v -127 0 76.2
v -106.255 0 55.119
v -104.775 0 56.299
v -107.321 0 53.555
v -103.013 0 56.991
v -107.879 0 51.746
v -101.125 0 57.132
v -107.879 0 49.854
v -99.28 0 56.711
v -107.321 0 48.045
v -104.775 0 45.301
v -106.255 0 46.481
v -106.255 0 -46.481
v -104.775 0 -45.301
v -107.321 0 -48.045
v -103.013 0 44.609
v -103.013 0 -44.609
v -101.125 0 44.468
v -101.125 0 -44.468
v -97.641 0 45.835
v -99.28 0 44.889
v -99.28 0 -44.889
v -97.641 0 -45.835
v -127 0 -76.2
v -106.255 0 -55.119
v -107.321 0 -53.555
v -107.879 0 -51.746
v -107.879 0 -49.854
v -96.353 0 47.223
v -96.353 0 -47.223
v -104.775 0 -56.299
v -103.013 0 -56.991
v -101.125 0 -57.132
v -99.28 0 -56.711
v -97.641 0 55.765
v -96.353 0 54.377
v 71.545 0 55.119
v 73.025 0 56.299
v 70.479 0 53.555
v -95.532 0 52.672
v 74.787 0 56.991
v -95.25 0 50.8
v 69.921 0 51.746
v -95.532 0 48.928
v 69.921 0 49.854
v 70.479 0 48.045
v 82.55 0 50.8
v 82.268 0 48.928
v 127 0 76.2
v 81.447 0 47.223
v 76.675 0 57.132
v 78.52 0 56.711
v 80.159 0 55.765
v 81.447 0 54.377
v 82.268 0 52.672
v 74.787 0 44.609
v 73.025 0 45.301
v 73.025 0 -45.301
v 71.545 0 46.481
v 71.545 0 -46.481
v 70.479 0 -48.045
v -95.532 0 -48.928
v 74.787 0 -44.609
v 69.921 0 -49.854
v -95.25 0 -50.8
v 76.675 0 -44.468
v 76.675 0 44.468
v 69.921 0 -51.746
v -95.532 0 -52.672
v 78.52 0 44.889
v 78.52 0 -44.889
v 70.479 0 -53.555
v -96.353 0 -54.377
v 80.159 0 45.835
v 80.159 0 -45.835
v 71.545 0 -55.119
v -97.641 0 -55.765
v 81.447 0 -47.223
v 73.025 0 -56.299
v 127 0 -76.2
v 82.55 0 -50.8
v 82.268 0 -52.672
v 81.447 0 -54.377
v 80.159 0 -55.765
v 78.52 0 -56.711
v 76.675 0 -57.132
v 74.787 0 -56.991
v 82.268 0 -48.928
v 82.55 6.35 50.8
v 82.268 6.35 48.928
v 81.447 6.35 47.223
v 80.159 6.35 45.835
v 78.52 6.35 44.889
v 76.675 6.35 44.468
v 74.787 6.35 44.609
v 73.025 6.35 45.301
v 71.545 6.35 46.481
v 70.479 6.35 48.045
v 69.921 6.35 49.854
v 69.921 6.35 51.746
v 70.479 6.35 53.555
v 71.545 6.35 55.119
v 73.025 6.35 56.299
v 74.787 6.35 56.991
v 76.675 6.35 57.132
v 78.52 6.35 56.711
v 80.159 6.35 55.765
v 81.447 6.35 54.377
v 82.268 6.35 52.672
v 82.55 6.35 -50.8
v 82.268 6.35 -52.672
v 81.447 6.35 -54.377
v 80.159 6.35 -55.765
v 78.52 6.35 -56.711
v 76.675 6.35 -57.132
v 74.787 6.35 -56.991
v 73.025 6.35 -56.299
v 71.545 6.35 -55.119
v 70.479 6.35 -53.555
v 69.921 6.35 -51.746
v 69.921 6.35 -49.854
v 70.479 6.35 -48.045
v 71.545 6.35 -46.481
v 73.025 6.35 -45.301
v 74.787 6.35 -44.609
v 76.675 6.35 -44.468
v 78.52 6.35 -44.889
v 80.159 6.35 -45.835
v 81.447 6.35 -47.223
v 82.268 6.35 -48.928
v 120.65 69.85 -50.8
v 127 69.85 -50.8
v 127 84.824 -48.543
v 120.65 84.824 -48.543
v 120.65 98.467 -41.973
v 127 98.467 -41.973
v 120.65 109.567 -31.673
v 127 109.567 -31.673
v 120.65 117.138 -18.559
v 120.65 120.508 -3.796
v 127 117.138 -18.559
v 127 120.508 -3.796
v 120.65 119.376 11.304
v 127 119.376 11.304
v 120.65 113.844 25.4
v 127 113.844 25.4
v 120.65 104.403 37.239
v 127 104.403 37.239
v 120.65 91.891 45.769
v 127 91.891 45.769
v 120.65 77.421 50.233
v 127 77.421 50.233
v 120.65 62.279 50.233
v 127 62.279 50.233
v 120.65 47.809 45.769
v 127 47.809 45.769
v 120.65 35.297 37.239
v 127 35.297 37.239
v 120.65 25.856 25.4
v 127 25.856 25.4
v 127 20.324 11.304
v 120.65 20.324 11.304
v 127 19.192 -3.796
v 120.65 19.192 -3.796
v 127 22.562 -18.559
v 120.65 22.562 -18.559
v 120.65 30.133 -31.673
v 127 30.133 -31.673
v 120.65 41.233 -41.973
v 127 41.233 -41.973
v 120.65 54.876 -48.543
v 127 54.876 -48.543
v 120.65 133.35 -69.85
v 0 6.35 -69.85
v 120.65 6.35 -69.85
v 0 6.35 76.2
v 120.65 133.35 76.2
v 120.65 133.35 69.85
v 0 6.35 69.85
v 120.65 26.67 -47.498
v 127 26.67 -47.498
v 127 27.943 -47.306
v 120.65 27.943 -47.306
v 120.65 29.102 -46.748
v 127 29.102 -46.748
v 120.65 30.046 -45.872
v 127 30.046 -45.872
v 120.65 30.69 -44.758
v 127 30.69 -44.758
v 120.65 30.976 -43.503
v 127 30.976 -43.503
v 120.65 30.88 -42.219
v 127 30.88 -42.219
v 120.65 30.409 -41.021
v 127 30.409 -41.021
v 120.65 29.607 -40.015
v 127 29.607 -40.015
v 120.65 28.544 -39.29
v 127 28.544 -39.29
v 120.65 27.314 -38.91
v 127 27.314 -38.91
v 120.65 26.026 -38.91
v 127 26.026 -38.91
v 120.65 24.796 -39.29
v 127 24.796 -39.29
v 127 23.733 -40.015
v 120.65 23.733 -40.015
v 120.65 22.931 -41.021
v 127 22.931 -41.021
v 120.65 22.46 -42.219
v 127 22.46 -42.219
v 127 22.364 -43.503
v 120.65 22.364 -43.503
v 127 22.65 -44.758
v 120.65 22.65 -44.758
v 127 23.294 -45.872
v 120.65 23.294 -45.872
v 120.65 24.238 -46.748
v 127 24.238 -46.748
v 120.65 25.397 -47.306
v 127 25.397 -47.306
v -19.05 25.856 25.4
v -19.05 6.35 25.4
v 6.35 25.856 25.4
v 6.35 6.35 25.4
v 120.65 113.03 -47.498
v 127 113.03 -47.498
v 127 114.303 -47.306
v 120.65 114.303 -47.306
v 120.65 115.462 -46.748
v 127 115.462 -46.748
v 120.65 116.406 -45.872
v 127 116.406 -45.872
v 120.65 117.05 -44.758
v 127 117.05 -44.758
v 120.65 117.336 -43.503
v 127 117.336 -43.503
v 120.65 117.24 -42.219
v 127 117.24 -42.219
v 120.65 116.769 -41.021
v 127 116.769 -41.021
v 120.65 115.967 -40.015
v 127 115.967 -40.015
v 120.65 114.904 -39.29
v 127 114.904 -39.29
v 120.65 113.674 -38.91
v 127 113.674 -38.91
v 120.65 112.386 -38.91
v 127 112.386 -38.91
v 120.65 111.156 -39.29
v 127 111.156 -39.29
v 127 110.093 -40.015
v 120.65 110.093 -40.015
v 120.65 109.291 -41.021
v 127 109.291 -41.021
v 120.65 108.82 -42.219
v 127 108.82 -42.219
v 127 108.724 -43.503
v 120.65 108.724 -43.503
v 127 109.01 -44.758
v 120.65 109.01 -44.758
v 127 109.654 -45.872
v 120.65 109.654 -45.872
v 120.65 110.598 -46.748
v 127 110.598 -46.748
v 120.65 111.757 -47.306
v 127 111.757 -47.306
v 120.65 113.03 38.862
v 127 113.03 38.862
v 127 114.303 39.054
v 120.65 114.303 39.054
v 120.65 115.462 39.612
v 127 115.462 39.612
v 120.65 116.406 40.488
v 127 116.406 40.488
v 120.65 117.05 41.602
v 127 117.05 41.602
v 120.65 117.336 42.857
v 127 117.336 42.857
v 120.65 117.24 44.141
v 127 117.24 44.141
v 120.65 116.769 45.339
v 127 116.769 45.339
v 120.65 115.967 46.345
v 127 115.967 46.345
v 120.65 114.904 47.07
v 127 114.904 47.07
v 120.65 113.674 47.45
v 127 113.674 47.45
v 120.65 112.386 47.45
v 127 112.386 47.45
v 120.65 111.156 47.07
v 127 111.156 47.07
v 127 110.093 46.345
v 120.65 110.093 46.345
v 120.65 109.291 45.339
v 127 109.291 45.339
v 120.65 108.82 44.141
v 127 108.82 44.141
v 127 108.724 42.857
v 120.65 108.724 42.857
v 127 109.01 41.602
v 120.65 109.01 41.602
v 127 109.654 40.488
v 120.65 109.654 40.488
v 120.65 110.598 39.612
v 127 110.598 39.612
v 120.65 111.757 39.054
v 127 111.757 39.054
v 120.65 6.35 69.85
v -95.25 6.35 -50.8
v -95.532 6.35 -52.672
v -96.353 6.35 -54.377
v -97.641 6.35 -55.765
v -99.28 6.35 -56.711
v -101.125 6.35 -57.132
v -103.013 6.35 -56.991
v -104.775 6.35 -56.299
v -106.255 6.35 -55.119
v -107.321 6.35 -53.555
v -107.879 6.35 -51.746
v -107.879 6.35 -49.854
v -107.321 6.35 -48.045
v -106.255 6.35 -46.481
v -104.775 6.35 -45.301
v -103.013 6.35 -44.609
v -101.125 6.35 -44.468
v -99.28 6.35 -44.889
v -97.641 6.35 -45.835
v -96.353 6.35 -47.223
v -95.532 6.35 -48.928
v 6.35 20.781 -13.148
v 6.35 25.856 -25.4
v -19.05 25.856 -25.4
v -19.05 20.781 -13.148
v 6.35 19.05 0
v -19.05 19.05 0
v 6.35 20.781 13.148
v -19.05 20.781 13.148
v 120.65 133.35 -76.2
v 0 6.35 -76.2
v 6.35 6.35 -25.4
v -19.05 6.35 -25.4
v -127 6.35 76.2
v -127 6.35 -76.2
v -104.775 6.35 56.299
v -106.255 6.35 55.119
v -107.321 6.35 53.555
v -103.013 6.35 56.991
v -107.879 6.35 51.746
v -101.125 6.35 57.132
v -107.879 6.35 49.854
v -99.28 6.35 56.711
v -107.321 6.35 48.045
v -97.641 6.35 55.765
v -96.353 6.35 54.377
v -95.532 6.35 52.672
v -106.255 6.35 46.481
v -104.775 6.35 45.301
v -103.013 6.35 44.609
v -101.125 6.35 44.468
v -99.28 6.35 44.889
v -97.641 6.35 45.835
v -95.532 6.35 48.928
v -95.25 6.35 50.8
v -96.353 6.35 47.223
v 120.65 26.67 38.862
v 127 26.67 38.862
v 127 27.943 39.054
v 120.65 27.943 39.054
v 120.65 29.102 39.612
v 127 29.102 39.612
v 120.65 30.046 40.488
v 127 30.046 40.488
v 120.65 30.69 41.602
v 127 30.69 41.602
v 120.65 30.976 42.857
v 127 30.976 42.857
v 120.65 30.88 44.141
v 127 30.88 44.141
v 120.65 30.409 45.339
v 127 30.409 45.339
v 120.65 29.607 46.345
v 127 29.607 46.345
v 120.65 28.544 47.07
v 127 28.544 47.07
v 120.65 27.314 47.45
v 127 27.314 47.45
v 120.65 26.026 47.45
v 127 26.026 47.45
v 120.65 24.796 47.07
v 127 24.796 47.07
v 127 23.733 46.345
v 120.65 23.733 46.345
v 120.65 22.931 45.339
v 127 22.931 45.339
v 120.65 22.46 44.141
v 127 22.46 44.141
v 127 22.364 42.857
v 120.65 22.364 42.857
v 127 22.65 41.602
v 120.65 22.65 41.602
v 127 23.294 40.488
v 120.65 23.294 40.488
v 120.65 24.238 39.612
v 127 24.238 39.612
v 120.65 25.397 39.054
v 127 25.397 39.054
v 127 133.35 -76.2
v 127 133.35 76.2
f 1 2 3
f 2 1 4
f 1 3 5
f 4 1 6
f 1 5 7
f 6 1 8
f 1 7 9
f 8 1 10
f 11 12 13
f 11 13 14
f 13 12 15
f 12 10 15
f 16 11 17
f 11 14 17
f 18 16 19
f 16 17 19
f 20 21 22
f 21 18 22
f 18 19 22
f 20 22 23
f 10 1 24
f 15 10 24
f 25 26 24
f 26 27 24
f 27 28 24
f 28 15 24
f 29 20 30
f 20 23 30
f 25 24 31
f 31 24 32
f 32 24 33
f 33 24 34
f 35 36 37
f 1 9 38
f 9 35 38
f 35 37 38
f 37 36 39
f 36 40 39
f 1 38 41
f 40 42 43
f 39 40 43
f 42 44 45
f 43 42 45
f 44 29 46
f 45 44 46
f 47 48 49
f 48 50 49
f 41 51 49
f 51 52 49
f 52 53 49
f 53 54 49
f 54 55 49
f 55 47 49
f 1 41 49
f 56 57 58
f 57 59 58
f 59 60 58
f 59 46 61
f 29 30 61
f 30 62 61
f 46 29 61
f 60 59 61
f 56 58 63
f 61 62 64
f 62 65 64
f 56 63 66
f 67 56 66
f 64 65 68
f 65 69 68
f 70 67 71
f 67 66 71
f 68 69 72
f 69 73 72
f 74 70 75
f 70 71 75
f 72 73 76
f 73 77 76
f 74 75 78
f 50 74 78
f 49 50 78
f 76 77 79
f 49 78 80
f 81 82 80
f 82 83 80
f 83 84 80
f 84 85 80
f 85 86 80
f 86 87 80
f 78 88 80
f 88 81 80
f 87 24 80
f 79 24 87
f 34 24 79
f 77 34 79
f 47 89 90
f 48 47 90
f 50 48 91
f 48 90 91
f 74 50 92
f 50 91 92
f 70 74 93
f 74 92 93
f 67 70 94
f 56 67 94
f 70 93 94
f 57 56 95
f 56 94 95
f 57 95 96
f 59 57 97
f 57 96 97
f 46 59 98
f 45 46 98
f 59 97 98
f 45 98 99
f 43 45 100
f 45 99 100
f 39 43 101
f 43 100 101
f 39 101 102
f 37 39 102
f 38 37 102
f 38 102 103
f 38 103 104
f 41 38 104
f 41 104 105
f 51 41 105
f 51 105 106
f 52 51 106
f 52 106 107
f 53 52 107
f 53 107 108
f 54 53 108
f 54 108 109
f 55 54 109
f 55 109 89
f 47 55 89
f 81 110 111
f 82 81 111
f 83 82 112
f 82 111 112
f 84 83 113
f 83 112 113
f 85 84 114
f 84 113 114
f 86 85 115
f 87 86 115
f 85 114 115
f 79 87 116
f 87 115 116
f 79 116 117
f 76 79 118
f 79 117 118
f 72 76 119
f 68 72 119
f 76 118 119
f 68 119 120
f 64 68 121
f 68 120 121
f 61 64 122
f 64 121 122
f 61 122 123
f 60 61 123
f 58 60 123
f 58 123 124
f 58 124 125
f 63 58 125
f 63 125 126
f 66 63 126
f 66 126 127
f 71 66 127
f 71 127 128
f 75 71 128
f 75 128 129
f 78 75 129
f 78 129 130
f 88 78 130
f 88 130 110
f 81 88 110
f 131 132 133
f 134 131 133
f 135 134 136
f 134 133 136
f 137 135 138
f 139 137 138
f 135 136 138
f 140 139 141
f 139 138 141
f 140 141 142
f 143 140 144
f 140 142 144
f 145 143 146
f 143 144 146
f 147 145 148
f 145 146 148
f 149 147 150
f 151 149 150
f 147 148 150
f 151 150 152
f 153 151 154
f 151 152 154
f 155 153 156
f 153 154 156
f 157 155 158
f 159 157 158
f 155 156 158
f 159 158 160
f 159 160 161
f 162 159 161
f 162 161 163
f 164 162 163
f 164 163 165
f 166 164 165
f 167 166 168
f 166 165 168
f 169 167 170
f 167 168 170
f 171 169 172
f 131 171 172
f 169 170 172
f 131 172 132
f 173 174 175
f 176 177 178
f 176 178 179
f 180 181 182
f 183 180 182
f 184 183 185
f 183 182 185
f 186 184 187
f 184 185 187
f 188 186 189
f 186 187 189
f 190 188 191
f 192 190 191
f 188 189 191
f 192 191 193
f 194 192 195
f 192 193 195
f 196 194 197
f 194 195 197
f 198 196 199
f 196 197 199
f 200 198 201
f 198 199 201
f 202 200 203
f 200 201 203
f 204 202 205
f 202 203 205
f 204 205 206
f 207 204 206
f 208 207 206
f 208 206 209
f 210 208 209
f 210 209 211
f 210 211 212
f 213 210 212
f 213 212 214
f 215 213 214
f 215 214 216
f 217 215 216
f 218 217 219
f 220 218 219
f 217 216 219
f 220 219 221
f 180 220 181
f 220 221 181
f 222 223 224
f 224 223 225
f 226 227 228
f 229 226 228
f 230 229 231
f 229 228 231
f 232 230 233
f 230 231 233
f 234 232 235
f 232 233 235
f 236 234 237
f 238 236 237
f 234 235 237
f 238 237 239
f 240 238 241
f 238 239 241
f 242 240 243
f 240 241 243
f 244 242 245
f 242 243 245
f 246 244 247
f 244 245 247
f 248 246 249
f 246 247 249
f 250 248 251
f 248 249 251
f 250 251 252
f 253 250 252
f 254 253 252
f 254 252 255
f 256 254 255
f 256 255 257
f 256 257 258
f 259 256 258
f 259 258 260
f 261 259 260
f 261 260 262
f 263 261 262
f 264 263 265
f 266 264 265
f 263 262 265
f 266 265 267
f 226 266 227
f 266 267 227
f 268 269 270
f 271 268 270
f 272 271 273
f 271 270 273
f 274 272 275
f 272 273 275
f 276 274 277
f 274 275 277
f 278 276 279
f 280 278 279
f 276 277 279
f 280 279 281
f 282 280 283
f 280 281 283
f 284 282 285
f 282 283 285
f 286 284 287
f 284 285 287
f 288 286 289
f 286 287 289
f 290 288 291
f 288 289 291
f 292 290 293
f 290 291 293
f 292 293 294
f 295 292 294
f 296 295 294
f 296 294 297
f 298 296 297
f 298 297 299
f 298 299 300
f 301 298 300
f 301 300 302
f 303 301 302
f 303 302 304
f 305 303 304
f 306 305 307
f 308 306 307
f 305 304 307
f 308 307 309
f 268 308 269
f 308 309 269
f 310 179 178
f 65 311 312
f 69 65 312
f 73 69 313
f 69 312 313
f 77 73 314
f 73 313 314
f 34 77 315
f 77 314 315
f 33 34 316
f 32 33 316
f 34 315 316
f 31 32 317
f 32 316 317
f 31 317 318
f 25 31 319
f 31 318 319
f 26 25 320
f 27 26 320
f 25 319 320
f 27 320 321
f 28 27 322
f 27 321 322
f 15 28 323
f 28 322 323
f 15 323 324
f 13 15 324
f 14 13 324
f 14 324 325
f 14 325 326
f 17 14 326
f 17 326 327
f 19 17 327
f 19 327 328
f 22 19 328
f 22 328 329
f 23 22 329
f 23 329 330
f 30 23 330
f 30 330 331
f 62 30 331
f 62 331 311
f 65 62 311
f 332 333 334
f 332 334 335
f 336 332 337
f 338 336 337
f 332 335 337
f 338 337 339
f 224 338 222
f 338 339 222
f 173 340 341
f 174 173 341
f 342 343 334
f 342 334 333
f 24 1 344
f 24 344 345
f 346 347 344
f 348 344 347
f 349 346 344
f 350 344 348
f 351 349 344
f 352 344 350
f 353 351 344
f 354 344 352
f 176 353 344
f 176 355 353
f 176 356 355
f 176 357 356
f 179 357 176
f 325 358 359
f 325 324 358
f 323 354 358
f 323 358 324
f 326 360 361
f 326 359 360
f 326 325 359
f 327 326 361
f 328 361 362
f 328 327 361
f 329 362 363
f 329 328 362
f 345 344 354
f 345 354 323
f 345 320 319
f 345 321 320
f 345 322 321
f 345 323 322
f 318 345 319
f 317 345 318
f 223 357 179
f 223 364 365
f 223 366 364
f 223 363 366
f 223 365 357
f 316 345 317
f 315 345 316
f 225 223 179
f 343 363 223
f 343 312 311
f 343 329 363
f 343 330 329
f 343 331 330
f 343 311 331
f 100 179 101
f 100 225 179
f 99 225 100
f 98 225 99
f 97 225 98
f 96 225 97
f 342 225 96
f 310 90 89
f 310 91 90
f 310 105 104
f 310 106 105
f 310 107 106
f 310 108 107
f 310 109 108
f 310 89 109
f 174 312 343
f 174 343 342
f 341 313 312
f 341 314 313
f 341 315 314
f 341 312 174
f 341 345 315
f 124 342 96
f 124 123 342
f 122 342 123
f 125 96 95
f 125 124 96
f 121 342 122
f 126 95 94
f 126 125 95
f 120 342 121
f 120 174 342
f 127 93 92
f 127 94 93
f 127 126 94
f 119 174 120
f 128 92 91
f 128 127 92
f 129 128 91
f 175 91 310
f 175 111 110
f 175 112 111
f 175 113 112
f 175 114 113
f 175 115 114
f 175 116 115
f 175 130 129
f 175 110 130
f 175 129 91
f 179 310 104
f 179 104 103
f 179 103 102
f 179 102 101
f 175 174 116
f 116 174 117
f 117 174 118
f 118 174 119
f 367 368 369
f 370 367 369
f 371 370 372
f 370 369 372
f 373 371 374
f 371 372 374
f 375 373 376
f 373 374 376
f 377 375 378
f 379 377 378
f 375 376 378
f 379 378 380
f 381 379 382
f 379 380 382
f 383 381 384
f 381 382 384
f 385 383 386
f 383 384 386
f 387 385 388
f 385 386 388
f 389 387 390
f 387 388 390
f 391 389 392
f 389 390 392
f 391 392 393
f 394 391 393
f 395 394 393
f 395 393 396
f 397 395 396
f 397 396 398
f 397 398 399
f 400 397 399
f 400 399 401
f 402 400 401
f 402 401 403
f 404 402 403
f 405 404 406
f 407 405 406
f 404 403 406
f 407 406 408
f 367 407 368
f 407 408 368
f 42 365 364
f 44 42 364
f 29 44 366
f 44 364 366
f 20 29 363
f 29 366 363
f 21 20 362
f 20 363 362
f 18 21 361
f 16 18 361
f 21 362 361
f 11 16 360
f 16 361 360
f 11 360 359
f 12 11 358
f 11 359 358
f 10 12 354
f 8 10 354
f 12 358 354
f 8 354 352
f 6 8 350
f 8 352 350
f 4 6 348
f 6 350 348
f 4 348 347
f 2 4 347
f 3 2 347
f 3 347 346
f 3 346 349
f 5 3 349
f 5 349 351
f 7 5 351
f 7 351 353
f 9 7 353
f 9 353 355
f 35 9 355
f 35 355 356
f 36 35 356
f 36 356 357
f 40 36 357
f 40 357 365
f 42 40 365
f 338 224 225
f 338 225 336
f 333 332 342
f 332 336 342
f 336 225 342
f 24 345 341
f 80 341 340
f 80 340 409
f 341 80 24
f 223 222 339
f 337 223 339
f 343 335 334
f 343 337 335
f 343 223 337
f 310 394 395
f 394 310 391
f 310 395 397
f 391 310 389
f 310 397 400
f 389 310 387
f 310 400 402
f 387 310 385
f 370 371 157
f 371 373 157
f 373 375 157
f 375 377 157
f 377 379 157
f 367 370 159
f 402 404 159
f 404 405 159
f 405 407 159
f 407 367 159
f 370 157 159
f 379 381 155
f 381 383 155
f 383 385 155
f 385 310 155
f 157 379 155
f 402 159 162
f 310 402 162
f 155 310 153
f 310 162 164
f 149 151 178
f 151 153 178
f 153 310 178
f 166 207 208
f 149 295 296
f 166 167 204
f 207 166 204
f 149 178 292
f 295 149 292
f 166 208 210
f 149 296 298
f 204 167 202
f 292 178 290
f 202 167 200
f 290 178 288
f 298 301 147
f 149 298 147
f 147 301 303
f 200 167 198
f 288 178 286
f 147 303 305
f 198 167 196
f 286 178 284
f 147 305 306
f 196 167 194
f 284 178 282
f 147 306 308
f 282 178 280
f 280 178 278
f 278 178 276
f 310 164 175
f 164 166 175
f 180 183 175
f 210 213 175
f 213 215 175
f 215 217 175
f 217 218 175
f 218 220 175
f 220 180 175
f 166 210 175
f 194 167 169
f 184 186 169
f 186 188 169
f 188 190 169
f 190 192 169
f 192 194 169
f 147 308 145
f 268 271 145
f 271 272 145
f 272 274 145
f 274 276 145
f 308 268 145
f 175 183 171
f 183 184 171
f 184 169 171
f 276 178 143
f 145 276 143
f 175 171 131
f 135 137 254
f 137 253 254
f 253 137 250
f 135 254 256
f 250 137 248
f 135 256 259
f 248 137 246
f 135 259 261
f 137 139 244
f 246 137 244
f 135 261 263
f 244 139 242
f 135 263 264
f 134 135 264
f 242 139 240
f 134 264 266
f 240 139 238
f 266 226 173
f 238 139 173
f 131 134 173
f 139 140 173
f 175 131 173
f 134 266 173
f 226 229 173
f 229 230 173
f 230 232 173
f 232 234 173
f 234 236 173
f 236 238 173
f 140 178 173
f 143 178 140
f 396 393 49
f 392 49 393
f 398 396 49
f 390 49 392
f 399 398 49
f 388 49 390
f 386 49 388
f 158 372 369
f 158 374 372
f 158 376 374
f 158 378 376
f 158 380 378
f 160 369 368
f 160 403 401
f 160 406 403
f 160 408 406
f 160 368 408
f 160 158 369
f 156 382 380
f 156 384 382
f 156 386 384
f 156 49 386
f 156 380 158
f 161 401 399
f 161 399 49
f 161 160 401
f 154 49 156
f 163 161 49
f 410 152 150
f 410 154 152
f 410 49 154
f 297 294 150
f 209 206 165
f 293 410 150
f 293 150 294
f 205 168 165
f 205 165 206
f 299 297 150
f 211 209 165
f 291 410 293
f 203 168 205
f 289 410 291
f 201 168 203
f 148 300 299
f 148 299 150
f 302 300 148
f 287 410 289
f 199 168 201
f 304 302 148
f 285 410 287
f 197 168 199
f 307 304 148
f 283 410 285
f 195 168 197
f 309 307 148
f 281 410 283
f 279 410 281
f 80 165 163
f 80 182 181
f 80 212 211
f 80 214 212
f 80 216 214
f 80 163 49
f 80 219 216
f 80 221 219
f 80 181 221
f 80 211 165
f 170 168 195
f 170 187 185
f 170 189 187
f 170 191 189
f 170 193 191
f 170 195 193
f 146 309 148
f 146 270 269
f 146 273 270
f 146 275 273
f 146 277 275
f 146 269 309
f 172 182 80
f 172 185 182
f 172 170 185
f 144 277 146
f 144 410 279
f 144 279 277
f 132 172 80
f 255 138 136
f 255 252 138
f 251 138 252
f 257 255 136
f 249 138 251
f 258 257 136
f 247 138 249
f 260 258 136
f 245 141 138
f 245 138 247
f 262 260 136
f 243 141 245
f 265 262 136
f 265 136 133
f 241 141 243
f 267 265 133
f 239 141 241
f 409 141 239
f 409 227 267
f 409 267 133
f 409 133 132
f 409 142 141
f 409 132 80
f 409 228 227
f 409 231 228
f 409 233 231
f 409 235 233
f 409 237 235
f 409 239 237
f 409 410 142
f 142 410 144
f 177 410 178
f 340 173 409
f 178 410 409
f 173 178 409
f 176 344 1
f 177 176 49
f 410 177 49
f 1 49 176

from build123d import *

# Parameters (mm, degrees)
SKETCH1_W           = 254
SKETCH1_H           = 152.4
BOSS_EXTRUDE1_DEPTH = 6.35
SKETCH2_W           = 152.4
SKETCH2_H           = 127
SKETCH2_R           = 50.8
SKETCH2_R_2         = 4.318
BOSS_EXTRUDE2_DEPTH = 6.35
BOSS_EXTRUDE3_DEPTH = 6.35
BOSS_EXTRUDE4_DEPTH = 6.35
SKETCH5_W           = 25.4
SKETCH5_H           = 50.8
BOSS_EXTRUDE5_DEPTH = 25.4
SKETCH6_R           = 50.8
CUT_EXTRUDE1_DEPTH  = 25.4
SKETCH7_R           = 6.35
CUT_EXTRUDE2_DEPTH  = 25.4


with BuildPart() as part:
    # Sketch1 → Boss-Extrude1 (new body)
    with BuildSketch(Plane(origin=(0, 0, 0), x_dir=(1, 0, 0), z_dir=(0, 1, 0))):
        Rectangle(SKETCH1_W, SKETCH1_H)
    extrude(amount=BOSS_EXTRUDE1_DEPTH)

    # Sketch2 → Boss-Extrude2 (add)
    with BuildSketch(Plane(origin=(127, 0, 0), x_dir=(0, 0, -1), z_dir=(1, 0, 0))):
        with Locations((0, 69.85)):
            Rectangle(SKETCH2_W, SKETCH2_H)
        with Locations((0, 69.85)):
            Circle(SKETCH2_R, mode=Mode.SUBTRACT)
        with Locations((-43.18, 26.67)):
            Circle(SKETCH2_R_2, mode=Mode.SUBTRACT)
        with Locations((43.18, 26.67)):
            Circle(SKETCH2_R_2, mode=Mode.SUBTRACT)
        with Locations((43.18, 113.03)):
            Circle(SKETCH2_R_2, mode=Mode.SUBTRACT)
        with Locations((-43.18, 113.03)):
            Circle(SKETCH2_R_2, mode=Mode.SUBTRACT)
    extrude(amount=-BOSS_EXTRUDE2_DEPTH)

    # Sketch3 → Boss-Extrude3 (add)
    with BuildSketch(Plane.XY.offset(76.2)):
        Polygon((120.65, 133.35), (0, 6.35), (120.65, 6.35), align=None)
    extrude(amount=-BOSS_EXTRUDE3_DEPTH)

    # Sketch4 → Boss-Extrude4 (add)
    with BuildSketch(Plane(origin=(0, 0, -76.2), x_dir=(-1, 0, 0), z_dir=(0, 0, -1))):
        Polygon((-120.65, 133.35), (0, 6.35), (-120.65, 6.35), align=None)
    extrude(amount=-BOSS_EXTRUDE4_DEPTH)

    # Sketch5 → Boss-Extrude5 (add)
    with BuildSketch(Plane(origin=(0, 6.35, 0), x_dir=(1, 0, 0), z_dir=(0, 1, 0))):
        with Locations((-6.35, 0)):
            Rectangle(SKETCH5_W, SKETCH5_H)
    extrude(amount=BOSS_EXTRUDE5_DEPTH)

    # Sketch6 → Cut-Extrude1 (cut)
    with BuildSketch(Plane.ZY.offset(19.05)):
        with Locations((0, 69.85)):
            Circle(SKETCH6_R)
    extrude(amount=-CUT_EXTRUDE1_DEPTH, mode=Mode.SUBTRACT)

    # Sketch7 → Cut-Extrude2 (cut)
    with BuildSketch(Plane(origin=(0, 6.35, 0), x_dir=(1, 0, 0), z_dir=(0, 1, 0))):
        with Locations((-101.6, 50.8)):
            Circle(SKETCH7_R)
        with Locations((-101.6, -50.8)):
            Circle(SKETCH7_R)
        with Locations((76.2, -50.8)):
            Circle(SKETCH7_R)
        with Locations((76.2, 50.8)):
            Circle(SKETCH7_R)
    extrude(amount=-CUT_EXTRUDE2_DEPTH, mode=Mode.SUBTRACT)


solid = part.part
